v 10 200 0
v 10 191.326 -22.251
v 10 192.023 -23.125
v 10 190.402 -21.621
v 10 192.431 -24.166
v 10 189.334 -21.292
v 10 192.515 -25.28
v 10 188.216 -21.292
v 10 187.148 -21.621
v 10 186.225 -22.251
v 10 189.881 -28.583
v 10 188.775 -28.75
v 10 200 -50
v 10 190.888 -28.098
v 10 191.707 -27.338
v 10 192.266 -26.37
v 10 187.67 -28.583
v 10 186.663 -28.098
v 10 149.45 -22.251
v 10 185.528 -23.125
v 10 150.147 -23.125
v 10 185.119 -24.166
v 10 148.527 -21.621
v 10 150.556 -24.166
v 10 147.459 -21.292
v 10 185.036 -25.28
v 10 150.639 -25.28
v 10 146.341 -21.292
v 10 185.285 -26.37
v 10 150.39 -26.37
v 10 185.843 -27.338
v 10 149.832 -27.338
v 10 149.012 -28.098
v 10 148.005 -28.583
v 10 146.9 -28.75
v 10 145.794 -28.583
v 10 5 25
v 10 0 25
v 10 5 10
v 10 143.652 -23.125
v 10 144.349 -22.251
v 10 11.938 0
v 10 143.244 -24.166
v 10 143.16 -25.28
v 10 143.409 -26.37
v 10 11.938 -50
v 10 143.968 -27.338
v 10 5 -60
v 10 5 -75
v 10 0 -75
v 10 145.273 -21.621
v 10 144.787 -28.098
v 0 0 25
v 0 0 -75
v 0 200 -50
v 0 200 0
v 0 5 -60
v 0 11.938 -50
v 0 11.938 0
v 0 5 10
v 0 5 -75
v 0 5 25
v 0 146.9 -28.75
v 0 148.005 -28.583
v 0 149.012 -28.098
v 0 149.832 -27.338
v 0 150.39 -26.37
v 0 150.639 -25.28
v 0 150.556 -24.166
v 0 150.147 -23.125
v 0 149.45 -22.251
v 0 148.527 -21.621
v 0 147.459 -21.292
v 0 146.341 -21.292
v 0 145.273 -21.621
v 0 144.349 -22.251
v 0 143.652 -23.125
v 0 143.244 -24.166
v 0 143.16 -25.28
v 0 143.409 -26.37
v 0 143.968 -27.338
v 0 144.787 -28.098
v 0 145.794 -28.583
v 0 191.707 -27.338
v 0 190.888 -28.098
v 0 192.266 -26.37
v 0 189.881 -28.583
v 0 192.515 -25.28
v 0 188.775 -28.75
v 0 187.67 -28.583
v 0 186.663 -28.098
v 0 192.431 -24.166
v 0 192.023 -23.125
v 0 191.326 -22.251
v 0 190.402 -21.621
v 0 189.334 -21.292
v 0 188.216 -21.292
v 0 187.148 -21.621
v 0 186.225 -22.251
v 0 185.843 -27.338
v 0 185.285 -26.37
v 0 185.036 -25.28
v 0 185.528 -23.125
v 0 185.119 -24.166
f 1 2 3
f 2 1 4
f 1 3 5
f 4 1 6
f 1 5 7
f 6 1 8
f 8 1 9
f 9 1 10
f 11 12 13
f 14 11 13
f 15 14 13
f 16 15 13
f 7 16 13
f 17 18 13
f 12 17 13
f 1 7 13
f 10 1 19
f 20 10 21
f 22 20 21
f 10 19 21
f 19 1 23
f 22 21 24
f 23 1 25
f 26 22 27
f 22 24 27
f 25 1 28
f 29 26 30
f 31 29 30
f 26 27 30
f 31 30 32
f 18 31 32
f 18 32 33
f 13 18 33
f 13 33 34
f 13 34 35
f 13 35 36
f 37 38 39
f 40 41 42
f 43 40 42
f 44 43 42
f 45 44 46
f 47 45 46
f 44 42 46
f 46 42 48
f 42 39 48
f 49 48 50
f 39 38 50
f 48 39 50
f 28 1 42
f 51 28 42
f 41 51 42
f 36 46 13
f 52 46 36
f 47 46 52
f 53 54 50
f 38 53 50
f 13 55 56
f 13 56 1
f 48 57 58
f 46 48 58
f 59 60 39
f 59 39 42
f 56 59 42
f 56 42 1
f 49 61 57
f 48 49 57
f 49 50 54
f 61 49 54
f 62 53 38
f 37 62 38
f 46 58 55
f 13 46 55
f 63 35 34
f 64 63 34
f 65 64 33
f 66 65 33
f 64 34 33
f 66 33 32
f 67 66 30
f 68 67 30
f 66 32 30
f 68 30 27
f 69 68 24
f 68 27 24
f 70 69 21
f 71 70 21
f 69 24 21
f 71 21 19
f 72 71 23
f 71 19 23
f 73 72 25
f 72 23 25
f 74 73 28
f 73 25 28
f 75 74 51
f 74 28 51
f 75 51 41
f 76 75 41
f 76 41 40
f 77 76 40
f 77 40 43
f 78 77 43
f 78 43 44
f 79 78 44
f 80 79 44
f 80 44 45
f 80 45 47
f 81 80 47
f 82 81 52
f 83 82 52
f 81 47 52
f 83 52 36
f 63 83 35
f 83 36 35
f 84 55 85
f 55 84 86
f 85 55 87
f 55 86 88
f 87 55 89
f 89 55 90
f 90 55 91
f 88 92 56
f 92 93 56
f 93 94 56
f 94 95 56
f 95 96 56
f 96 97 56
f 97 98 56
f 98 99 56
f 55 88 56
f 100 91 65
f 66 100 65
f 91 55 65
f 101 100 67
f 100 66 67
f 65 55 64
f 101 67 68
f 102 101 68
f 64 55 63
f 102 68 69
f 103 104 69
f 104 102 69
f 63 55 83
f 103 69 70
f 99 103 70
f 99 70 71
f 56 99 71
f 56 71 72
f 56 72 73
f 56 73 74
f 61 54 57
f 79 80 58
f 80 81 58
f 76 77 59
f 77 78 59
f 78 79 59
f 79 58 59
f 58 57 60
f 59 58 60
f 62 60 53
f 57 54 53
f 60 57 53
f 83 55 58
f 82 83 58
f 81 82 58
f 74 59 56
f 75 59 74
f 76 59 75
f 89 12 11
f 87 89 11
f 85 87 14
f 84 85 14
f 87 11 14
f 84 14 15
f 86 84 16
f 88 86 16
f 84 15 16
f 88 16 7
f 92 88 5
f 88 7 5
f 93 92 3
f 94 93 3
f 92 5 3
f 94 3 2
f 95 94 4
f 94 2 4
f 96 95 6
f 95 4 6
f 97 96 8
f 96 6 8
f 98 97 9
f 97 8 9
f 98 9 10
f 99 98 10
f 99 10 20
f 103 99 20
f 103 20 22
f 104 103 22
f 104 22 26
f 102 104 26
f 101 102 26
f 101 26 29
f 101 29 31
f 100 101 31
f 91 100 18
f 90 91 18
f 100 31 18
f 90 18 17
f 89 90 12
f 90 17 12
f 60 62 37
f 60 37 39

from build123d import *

# Parameters (mm, degrees)
BOSS_EXTRUDE1_DEPTH = 200
SKETCH2_R           = 3.75
CUT_EXTRUDE1_DEPTH  = 10
CUT_EXTRUDE2_DEPTH  = 10


with BuildPart() as part:
    # Sketch1 → Boss-Extrude1 (new body)
    with BuildSketch(Plane(origin=(0, 0, 0), x_dir=(1, 0, 0), z_dir=(0, 1, 0))):
        Polygon((10, 0), (10, 50), (10, 75), (0, 75), (0, 50), (0, 0), (0, -25), (10, -25), align=None)
    extrude(amount=BOSS_EXTRUDE1_DEPTH)

    # Sketch2 → Cut-Extrude1 (cut)
    with BuildSketch(Plane(origin=(10, 0, 0), x_dir=(0, 0, -1), z_dir=(1, 0, 0))):
        with Locations((25, 188.775303779)):
            Circle(SKETCH2_R)
        with Locations((25, 146.899681817)):
            Circle(SKETCH2_R)
    extrude(amount=-CUT_EXTRUDE1_DEPTH, mode=Mode.SUBTRACT)

    # Sketch3 → Cut-Extrude2 (cut)
    with BuildSketch(Plane.ZY):
        Polygon((25, 200), (25, 5), (10, 5), (0, 11.937821542), (0, 200), align=None)
        Polygon((-75, 5), (-60, 5), (-50, 11.937821542), (-50, 200), (-75, 200), align=None)
    extrude(amount=-CUT_EXTRUDE2_DEPTH, mode=Mode.SUBTRACT)


solid = part.part
